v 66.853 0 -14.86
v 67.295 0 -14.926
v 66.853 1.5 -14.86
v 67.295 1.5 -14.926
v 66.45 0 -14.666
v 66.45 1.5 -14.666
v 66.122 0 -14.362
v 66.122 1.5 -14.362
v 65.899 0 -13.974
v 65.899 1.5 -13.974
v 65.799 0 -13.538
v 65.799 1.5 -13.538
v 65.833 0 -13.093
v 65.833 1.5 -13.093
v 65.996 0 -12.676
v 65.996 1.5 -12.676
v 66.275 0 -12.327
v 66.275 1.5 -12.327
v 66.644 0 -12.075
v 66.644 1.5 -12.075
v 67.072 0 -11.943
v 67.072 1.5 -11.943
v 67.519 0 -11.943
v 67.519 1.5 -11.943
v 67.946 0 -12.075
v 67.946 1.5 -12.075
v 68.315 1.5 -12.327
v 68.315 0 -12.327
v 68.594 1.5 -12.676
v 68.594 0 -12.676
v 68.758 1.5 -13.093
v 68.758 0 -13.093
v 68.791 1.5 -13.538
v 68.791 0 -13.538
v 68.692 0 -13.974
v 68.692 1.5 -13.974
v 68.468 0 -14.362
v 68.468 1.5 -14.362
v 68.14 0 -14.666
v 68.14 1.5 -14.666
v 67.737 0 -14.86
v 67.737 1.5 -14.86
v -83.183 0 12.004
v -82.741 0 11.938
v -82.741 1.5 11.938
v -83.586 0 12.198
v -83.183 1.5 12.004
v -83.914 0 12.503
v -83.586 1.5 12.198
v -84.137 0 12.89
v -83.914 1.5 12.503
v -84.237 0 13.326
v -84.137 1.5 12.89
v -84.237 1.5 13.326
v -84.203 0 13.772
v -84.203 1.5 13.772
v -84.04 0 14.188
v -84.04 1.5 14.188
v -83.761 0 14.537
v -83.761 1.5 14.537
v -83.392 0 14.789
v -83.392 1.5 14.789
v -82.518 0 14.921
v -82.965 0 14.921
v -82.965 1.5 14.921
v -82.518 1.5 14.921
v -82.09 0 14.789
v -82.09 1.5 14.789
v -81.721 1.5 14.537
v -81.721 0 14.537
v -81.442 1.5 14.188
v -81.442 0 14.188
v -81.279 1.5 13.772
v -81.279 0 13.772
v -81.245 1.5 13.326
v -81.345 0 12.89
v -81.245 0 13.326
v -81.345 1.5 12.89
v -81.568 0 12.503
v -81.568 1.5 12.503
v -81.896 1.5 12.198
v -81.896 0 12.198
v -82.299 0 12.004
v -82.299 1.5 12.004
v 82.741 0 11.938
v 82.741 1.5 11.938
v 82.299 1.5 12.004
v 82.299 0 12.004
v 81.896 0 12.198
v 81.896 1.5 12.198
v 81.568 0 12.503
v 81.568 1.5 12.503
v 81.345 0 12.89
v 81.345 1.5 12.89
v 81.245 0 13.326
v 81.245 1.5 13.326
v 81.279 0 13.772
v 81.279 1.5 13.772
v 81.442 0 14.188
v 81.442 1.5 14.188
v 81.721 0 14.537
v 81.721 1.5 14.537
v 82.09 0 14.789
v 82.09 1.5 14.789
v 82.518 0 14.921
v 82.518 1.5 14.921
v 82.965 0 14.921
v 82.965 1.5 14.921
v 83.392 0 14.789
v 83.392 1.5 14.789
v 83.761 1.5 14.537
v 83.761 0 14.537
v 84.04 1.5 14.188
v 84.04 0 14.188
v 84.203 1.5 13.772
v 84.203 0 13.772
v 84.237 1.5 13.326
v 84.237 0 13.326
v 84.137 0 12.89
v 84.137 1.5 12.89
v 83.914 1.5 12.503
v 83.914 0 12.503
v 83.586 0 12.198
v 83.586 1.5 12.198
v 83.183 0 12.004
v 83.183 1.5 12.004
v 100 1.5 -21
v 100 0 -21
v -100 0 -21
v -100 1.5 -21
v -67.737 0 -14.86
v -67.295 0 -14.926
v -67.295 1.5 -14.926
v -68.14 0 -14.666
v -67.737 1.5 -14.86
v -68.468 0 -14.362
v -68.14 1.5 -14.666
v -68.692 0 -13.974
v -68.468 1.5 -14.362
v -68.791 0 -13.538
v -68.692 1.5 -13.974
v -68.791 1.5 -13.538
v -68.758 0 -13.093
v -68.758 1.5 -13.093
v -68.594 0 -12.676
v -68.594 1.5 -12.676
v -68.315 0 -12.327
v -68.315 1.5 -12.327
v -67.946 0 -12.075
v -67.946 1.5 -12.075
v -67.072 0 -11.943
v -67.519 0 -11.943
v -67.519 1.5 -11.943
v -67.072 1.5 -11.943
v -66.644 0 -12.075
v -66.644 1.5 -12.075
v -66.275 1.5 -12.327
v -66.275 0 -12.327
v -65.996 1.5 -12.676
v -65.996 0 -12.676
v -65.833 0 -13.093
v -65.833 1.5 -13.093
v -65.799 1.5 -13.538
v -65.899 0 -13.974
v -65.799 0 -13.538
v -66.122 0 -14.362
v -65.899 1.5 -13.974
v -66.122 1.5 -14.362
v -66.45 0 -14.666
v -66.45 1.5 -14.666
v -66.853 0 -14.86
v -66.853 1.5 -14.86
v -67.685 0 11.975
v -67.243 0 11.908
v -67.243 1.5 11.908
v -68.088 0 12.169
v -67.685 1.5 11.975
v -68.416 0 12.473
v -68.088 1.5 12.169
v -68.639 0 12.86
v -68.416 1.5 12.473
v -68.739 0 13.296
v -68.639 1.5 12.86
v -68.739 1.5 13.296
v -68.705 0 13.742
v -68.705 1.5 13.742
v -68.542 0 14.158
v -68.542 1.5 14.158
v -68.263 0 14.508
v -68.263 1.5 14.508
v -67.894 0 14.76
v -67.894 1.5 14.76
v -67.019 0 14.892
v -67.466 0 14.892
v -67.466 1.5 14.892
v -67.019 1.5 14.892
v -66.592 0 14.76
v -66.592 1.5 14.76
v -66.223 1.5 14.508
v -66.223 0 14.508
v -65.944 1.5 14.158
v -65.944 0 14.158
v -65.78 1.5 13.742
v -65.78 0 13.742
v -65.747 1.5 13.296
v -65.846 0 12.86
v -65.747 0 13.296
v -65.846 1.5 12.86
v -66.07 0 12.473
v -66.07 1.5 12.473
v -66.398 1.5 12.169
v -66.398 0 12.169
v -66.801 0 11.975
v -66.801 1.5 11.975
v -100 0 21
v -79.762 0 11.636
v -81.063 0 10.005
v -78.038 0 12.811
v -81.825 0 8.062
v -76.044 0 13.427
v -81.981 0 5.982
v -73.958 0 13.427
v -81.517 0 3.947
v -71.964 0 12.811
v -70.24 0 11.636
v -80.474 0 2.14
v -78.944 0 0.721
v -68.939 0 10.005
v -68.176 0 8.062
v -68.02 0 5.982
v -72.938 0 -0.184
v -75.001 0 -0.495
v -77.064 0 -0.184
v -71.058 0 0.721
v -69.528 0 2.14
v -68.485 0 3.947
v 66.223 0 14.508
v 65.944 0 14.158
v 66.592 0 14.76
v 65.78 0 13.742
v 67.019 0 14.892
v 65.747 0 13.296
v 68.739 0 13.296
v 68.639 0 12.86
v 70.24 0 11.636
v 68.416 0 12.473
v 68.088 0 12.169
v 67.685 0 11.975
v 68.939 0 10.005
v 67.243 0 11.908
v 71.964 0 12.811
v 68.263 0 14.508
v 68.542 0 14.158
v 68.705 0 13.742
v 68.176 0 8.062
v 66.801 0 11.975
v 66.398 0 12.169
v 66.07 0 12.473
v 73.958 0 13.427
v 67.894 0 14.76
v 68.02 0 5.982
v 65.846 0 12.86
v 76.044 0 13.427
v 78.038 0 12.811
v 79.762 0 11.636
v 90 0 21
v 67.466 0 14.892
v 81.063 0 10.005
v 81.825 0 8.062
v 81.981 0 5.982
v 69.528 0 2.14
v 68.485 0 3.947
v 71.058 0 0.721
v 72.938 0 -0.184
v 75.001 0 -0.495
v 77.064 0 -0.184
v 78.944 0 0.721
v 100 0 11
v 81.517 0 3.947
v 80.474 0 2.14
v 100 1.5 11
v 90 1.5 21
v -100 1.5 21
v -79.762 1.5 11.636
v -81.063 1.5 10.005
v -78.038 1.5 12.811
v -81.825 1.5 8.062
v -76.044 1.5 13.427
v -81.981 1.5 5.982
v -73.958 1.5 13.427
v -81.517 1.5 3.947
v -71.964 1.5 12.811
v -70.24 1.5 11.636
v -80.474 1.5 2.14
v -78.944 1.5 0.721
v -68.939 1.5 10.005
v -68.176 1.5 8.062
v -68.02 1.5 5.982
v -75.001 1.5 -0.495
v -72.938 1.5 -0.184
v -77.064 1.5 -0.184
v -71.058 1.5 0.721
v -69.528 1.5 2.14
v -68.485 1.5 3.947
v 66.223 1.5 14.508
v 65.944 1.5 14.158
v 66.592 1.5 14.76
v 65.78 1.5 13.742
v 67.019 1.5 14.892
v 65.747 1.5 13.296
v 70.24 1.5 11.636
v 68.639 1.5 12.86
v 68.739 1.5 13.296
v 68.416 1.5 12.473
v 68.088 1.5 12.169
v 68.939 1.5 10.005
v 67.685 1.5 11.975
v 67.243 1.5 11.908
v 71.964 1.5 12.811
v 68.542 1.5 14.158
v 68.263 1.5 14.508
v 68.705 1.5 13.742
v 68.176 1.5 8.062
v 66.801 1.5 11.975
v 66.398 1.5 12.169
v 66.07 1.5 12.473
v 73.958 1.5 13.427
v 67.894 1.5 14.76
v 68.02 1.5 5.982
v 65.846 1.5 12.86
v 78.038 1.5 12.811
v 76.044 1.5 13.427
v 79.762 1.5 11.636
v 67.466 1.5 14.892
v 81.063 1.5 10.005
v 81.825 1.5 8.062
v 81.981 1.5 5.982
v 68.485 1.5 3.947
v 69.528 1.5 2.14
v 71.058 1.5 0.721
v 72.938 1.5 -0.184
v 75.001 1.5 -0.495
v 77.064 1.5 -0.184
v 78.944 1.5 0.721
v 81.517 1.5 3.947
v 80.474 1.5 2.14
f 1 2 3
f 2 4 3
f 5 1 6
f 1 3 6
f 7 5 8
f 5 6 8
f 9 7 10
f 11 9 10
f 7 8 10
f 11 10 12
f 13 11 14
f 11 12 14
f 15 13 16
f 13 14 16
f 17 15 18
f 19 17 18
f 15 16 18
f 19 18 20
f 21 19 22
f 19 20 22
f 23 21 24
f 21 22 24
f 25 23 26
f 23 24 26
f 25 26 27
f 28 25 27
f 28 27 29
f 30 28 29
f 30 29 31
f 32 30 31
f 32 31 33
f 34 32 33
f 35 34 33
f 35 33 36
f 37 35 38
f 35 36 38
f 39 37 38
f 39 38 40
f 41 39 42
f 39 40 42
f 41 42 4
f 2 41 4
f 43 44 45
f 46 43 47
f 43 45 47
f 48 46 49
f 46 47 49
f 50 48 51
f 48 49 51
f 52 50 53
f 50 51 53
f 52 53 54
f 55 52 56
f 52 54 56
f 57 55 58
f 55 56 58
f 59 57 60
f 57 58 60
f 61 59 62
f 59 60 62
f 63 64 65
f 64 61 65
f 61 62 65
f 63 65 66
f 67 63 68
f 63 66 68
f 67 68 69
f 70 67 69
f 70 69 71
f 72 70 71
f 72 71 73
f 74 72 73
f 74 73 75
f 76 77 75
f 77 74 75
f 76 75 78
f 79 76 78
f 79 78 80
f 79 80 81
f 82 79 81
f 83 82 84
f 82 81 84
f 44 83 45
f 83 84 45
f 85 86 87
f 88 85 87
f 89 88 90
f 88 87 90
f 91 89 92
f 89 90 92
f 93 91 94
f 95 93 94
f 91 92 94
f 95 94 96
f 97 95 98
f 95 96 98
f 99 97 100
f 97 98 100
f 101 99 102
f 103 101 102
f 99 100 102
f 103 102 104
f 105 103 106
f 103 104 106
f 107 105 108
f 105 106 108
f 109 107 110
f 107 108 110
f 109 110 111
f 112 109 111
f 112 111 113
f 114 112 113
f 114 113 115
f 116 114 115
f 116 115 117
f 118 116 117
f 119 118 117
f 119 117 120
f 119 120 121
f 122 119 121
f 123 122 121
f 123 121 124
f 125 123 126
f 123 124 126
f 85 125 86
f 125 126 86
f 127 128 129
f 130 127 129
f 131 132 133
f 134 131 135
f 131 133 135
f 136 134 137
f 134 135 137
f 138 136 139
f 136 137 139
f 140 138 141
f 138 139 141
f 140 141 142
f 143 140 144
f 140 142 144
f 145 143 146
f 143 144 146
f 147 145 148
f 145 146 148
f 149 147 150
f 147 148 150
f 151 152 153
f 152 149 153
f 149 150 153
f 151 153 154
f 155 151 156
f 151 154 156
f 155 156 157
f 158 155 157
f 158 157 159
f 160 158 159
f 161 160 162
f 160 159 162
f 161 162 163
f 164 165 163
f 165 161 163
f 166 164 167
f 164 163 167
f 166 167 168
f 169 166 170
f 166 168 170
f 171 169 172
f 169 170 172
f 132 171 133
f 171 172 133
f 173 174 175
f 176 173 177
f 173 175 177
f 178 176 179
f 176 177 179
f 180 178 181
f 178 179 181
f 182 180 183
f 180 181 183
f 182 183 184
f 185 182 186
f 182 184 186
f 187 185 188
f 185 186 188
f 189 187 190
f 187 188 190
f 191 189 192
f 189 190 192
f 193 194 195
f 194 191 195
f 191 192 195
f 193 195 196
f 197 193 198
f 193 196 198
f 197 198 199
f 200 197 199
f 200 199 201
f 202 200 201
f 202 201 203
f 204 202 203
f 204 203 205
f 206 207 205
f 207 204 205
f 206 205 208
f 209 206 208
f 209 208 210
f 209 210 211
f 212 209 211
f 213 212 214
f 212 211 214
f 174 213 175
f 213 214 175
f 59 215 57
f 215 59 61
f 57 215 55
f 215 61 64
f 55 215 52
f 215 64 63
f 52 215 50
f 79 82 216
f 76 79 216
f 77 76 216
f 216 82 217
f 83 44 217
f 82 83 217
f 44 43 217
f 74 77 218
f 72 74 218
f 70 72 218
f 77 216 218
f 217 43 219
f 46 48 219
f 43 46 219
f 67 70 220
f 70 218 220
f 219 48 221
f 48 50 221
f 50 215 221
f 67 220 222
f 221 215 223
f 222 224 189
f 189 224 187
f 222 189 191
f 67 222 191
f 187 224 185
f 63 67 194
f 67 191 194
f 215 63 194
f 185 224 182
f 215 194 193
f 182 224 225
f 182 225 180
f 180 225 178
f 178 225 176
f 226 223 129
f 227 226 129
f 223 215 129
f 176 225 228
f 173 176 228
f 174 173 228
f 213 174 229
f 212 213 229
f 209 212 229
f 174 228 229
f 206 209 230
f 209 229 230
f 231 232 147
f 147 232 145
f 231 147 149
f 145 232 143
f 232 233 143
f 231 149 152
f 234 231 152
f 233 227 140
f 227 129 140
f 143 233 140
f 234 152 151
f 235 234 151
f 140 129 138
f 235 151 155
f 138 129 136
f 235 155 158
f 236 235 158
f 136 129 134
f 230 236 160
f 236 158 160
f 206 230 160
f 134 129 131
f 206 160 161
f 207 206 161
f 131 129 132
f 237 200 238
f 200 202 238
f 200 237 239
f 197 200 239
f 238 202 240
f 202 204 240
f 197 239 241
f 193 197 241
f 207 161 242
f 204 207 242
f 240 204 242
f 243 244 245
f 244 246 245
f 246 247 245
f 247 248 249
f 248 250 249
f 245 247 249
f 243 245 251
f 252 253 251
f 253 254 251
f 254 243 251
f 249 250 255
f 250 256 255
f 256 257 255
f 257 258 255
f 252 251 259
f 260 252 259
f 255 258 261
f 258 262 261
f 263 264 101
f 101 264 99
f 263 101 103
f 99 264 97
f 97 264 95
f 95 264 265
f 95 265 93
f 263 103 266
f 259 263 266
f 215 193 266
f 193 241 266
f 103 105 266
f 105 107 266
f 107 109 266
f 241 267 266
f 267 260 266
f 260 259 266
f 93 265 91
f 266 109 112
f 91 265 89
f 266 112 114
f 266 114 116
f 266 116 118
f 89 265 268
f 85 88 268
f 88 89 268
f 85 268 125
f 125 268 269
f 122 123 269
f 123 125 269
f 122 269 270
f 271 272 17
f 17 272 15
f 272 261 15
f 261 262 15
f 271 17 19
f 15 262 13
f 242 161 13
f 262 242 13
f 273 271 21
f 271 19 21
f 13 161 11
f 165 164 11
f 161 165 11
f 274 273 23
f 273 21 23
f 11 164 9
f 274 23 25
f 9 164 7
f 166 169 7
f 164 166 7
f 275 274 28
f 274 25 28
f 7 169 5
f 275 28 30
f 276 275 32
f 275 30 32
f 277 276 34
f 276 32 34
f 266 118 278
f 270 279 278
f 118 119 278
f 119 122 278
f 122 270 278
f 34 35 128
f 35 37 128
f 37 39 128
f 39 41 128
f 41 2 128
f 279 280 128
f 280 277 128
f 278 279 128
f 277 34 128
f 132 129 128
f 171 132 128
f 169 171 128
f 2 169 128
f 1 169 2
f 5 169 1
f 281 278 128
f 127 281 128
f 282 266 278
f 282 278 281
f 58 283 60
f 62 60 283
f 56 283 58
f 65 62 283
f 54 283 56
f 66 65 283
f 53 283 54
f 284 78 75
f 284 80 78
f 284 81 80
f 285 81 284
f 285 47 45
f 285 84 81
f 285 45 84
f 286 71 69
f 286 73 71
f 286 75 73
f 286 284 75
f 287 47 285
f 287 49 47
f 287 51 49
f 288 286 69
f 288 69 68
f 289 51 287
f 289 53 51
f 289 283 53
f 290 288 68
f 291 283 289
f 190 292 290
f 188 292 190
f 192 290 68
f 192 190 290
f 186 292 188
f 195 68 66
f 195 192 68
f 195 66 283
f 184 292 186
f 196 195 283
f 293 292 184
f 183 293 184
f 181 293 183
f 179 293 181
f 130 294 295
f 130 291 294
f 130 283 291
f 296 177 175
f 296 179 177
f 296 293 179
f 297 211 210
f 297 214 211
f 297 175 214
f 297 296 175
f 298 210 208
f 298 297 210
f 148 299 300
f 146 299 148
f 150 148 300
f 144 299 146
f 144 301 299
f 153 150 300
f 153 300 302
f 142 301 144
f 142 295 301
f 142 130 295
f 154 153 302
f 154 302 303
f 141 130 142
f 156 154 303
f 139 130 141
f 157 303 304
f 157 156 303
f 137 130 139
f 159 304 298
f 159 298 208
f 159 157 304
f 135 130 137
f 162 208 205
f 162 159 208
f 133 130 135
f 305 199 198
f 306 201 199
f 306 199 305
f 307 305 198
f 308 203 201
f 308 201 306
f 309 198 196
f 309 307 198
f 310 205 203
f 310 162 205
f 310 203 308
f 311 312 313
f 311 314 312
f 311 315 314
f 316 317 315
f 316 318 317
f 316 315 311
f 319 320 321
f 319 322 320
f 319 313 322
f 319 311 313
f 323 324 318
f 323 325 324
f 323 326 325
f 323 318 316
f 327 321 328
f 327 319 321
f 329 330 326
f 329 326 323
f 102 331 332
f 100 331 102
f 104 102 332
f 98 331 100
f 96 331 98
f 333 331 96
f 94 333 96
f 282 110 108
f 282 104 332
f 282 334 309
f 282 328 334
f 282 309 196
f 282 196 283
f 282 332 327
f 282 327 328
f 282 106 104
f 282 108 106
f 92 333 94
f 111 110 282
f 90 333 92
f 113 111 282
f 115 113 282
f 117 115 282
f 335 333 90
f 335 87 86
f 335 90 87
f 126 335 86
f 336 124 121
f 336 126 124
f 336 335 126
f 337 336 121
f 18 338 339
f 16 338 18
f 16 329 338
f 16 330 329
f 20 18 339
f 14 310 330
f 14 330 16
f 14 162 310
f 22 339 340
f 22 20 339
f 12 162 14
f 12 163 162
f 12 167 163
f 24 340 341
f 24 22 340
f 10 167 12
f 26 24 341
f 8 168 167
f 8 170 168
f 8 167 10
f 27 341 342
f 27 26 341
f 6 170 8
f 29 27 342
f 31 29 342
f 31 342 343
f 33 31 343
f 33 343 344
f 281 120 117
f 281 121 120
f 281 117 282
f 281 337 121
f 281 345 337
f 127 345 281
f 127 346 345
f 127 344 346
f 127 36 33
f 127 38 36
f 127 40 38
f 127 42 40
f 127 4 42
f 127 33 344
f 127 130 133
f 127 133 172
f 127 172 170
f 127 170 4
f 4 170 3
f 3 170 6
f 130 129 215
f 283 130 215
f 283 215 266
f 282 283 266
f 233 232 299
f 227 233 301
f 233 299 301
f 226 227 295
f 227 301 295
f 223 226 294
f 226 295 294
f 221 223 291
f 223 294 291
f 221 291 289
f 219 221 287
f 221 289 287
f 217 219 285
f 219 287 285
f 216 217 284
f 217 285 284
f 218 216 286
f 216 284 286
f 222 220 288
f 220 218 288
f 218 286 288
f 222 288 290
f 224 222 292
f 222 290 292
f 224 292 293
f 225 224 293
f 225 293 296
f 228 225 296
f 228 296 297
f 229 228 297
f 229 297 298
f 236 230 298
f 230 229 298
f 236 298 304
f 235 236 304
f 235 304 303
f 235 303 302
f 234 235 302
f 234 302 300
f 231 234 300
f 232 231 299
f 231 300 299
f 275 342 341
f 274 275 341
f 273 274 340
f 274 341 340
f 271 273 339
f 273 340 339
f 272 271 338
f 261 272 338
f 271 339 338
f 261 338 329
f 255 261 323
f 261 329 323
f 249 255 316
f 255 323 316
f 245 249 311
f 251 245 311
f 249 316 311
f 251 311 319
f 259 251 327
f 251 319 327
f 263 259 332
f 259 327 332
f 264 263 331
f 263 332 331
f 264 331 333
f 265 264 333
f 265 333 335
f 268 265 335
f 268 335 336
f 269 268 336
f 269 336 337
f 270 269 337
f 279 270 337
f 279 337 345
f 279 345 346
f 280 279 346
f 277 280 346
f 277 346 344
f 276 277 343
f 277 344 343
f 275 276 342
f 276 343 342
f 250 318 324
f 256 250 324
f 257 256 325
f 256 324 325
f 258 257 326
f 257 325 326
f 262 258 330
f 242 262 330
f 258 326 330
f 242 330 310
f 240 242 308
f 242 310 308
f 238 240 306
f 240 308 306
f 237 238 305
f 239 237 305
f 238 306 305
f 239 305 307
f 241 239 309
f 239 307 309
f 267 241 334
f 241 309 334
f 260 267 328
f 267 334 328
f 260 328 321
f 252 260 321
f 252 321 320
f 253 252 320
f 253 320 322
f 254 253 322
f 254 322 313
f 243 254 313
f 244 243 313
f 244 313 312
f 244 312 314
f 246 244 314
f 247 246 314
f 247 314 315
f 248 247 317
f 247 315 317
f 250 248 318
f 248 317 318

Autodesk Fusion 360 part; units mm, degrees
sketch "Sketch15" plane through (0, 0, 0) normal (0, 1, 0) x (1, 0, 0)
  line L0 (100, 21) -> (-100, 21)
  line L1 (-100, 21) -> (-100, -21)
  line L2 (-100, -21) -> (100, -21)
  line L3 (100, -21) -> (100, 21)
  line L4 (100, 21) -> (-100, -21) construction
  line L5 (-100, 21) -> (100, -21) construction
  dimension "d41" = 200
  dimension "d42" = 42
extrude "Extrude7" add sketch "Sketch15" along normal blind 1.5
hole "Hole5" at (67.2428, 0, 13.4085) direction (0, 1, 0) diameter 3 depth 7 tip angle 118
hole "Hole6" at (75.0009, 0, 6.5047) direction (0, 1, 0) diameter 14 depth 15 tip angle 118
hole "Hole7" at (82.7411, 0, 13.4378) direction (0, 1, 0) diameter 3 depth 5 tip angle 118
hole "Hole8" at (67.2952, 0, -13.4263) direction (0, 1, 0) diameter 3 depth 6 tip angle 118
sketch "Sketch16" plane through (0, 0, 0) normal (1, 0, 0) x (0, 1, 0)
  line L0 (-56.4532, 39.0008) -> (75, 39.0008)
  line L1 (75, 39.0008) -> (75, -35)
  line L2 (75, -35) -> (-56.4532, -35)
  line L3 (-56.4532, -35) -> (-56.4532, 39.0008)
ref_plane "WorkPlane2" through (0, 9.2734, 2.0004) normal (1, 0, 0) x (0, 1, 0)
mirror "Mirror1" about plane through (0, 9.2734, 2.0004) normal (1, 0, 0) of "Hole5", "Hole7", "Hole8", "Hole6"
chamfer "Chamfer1" distance 10 angle 45 1 edges at (100, 0.75, 21)
